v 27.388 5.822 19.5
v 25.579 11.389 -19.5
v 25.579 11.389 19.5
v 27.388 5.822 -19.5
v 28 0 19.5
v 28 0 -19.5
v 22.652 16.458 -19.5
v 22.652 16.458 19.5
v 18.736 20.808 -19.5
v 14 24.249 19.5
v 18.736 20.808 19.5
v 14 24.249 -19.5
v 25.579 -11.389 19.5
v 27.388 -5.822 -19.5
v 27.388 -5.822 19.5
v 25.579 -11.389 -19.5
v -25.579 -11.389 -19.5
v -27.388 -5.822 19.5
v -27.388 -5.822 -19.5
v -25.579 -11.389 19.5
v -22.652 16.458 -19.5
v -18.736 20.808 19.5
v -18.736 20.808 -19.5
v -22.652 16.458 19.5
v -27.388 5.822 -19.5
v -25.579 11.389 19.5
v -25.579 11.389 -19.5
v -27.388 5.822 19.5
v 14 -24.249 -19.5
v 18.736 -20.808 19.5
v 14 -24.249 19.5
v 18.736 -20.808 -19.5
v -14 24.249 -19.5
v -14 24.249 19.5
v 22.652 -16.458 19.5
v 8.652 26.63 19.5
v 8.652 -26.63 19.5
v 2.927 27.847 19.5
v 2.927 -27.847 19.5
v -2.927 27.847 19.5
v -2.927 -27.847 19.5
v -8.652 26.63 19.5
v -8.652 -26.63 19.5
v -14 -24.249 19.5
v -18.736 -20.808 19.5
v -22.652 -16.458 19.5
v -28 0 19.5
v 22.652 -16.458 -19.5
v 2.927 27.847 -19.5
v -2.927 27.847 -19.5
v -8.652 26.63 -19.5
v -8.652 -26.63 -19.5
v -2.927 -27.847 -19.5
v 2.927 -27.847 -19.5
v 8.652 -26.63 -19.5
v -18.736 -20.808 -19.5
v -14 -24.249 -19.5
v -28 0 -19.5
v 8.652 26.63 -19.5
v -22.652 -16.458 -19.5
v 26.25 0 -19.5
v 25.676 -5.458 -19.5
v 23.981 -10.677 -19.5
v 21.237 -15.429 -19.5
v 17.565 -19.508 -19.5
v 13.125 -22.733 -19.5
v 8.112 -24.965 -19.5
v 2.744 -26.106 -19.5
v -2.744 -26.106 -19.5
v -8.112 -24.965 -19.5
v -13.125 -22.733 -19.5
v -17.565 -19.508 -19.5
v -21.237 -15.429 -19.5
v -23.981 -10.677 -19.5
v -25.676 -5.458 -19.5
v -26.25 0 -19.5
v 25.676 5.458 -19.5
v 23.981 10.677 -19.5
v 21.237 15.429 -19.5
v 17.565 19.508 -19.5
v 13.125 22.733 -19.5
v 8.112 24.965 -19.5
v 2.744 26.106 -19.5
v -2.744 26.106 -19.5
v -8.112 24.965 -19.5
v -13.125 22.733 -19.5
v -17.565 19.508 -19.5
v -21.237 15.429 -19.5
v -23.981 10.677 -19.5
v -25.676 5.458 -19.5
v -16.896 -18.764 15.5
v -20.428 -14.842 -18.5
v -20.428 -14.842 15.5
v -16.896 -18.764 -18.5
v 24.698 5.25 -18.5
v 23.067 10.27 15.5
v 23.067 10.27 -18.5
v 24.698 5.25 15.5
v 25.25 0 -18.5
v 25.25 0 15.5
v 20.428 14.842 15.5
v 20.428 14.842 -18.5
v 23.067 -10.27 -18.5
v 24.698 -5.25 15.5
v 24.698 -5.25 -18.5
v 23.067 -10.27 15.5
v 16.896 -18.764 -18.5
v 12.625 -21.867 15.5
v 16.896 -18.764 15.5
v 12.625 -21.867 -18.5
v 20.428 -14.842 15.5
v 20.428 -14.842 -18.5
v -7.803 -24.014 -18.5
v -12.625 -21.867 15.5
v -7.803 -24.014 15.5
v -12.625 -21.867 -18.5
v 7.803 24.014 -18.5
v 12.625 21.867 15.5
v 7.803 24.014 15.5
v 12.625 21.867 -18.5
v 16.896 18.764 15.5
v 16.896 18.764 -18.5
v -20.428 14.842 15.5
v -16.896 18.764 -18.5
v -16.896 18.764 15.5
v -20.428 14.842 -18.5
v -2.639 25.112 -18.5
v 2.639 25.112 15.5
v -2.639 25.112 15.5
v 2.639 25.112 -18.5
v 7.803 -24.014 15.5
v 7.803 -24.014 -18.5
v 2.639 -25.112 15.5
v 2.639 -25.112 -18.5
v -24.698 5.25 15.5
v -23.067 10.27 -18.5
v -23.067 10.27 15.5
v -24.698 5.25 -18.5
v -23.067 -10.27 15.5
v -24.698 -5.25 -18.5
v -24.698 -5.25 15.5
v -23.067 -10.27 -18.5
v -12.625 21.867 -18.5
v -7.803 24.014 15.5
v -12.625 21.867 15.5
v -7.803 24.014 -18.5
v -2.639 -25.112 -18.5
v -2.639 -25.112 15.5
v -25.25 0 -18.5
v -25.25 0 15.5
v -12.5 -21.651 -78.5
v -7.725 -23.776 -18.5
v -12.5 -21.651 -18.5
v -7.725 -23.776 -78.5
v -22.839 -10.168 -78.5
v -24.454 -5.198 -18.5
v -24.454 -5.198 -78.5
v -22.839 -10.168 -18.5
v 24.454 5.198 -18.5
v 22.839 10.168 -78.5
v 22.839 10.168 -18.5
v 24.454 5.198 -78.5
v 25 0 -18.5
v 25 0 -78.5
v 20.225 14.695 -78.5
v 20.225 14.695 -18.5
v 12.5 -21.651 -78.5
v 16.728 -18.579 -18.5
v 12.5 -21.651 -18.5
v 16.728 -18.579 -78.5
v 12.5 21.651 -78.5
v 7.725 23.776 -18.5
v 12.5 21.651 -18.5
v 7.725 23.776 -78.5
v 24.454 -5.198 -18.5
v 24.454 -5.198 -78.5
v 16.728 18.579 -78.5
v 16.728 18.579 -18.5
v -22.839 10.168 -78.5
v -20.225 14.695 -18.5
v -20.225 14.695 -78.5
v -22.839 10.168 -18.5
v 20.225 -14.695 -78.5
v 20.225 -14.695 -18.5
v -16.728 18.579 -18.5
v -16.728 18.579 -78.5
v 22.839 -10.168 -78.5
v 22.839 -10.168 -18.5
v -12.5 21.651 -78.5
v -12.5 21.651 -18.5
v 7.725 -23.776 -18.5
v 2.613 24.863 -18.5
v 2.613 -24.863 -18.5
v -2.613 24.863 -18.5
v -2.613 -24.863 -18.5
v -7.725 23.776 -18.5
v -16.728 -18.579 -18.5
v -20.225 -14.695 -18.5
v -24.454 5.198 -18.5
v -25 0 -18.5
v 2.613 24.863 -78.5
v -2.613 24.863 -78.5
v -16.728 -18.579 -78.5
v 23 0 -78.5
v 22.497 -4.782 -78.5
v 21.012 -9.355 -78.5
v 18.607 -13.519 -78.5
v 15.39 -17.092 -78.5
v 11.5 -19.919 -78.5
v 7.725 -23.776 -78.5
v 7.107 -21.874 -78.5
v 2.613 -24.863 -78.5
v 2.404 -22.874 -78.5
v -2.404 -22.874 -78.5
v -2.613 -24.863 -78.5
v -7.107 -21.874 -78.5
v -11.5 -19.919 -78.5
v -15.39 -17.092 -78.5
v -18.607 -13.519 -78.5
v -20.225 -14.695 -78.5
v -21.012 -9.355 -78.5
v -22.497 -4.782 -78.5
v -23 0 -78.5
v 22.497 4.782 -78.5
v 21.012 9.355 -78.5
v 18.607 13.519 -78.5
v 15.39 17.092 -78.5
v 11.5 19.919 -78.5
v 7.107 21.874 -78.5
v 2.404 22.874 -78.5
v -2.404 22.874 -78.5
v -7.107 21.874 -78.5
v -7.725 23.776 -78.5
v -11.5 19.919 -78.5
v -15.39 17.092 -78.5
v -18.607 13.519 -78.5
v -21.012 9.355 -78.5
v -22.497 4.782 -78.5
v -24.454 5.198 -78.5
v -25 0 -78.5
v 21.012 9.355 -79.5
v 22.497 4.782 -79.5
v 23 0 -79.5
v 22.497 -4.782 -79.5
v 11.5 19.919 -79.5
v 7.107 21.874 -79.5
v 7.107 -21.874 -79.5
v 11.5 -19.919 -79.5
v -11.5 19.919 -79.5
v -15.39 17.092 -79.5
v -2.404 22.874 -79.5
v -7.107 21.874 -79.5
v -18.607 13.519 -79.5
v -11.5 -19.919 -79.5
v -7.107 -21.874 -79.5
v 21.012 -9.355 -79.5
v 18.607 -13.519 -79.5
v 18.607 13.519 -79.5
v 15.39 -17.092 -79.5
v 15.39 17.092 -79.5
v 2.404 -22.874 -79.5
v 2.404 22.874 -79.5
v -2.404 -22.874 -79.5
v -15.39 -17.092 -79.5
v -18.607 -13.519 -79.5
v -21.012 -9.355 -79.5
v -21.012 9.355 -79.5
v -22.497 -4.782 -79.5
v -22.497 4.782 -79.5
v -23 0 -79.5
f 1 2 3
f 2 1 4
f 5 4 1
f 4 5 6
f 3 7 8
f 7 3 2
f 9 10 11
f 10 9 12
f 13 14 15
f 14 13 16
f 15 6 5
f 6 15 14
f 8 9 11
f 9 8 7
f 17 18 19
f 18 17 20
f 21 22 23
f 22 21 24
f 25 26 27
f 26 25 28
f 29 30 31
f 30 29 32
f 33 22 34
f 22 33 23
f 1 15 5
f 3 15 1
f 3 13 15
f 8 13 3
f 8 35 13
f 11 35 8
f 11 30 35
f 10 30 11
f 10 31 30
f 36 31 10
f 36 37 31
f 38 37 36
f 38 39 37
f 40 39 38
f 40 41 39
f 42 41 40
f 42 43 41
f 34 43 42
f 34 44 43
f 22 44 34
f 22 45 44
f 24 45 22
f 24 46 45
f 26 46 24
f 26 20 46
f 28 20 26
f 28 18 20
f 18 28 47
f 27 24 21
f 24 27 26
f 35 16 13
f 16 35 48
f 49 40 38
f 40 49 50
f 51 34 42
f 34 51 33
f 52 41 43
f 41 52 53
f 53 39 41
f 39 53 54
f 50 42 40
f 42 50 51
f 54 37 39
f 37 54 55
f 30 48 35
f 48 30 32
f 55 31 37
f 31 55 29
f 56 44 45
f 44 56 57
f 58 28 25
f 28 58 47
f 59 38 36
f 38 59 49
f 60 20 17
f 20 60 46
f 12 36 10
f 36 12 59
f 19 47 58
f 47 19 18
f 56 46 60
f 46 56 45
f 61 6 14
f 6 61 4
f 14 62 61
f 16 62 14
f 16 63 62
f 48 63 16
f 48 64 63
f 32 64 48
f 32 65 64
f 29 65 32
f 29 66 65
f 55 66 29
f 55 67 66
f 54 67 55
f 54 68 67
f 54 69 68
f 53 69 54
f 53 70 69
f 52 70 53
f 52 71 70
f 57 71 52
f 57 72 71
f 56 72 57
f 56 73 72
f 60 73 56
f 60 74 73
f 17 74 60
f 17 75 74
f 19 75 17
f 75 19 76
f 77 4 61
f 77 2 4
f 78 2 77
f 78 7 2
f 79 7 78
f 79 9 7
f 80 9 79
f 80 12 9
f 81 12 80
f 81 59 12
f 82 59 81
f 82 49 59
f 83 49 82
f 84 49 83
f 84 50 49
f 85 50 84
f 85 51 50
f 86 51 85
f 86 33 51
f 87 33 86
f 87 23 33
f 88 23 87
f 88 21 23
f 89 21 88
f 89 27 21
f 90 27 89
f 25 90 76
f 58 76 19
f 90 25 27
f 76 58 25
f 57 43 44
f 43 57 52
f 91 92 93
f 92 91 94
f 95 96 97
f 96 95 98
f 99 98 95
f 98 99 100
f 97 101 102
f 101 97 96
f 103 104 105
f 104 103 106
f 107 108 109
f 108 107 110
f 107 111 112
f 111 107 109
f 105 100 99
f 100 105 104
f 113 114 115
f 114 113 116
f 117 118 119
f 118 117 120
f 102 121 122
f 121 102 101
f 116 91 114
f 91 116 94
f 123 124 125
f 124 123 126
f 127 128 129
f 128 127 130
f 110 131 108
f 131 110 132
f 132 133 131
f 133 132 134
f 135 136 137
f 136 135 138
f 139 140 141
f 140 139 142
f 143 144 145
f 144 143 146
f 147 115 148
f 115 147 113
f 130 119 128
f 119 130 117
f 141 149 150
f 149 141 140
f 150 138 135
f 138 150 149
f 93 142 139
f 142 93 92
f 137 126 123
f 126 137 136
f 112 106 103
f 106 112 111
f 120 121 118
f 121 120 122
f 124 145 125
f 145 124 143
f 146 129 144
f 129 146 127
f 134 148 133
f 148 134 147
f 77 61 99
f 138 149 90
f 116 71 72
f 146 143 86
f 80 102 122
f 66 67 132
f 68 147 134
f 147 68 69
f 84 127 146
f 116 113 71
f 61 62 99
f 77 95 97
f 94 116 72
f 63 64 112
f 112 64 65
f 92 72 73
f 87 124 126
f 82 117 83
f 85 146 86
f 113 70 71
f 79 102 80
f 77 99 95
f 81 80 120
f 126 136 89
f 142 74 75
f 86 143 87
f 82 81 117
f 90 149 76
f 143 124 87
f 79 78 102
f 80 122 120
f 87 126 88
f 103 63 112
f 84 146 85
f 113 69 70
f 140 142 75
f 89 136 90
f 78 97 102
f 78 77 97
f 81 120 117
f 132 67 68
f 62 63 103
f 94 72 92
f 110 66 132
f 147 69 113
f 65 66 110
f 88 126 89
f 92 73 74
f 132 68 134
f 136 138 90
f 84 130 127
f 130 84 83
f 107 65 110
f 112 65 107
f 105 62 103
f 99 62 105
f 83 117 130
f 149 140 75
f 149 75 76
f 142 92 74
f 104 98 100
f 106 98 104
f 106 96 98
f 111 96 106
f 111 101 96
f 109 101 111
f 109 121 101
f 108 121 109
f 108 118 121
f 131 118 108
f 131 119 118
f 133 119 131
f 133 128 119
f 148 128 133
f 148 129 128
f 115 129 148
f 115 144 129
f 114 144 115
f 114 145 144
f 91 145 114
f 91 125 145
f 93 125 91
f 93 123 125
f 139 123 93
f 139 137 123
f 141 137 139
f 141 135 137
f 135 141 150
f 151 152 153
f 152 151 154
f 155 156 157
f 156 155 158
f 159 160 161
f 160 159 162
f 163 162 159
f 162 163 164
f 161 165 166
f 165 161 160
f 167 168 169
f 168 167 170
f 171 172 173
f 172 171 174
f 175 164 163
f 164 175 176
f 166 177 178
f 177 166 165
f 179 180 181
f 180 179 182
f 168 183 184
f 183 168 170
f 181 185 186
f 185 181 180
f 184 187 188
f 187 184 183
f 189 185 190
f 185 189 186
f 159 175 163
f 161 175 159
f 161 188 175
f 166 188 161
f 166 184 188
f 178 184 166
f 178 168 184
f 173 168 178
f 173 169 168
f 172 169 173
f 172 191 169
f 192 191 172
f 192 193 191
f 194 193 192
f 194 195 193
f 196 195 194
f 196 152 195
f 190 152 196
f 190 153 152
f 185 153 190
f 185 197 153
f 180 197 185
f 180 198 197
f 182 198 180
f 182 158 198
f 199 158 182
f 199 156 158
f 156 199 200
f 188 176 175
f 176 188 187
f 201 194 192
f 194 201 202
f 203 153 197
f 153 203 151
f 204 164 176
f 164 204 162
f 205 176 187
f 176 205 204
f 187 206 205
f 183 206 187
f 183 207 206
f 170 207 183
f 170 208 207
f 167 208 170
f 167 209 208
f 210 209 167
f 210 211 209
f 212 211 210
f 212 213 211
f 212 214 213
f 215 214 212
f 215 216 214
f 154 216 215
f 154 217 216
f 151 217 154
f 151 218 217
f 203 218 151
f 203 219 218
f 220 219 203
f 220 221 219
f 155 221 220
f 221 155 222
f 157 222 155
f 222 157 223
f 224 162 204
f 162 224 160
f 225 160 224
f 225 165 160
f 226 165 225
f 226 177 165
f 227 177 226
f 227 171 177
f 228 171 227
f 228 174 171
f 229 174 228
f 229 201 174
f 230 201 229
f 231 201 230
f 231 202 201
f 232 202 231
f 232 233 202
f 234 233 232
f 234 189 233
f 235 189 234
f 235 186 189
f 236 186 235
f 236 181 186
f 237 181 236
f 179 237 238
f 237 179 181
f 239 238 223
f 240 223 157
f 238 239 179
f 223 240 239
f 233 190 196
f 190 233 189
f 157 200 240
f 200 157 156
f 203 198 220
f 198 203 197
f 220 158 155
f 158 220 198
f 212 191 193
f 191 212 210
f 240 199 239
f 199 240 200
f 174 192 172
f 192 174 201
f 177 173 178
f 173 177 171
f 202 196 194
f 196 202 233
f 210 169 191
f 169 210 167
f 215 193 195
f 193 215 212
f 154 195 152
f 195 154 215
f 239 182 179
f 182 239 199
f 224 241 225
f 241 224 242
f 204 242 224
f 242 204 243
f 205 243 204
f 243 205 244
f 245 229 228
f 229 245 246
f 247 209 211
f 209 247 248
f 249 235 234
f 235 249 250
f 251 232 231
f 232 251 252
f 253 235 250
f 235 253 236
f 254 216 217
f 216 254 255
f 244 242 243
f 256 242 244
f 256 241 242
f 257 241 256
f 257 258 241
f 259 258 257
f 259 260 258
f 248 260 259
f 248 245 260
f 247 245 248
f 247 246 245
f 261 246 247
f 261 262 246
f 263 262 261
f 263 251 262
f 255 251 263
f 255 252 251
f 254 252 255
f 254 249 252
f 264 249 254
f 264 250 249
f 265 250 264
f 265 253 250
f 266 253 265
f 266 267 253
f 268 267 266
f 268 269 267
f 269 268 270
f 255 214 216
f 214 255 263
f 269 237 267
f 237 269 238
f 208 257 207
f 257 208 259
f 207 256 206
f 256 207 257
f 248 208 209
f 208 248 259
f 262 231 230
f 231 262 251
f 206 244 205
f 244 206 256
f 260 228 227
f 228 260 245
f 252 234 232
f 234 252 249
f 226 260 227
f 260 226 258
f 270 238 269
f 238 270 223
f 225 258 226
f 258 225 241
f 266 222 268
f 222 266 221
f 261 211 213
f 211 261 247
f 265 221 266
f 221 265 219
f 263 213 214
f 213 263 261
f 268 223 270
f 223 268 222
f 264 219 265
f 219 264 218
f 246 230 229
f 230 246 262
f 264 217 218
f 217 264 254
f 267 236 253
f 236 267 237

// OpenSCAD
// Parameters
pipe_outer_diameter_mm = 50; //[25:100:0.1]
cap_outer_diameter_mm = 56; //[28:112:0.1]
wall_thickness_mm = 3; //[1.5:6:0.1]
socket_inner_diameter_mm = 50.5; //[25.25:101:0.1]
insertion_depth_mm = 35; //[17.5:70:0.5]
end_thickness_mm = 4; //[2:8:0.1]
chamfer_mm = 1; //[0:3:0.1]
overlap_mm = 1; //[0.5:2:0.1]
pipe_length_mm = 60; //[30:120:1]
pipe_wall_thickness_mm = 2; //[1:4:0.1]

// HT Pipe - complete geometry
module ht_pipe() {
  color("DimGray") {
    // Outer pipe
    cylinder(r=pipe_outer_diameter_mm/2, h=pipe_length_mm, center=true);
    // Inner cavity
    translate([0, 0, -overlap_mm/2])
      cylinder(r=(pipe_outer_diameter_mm/2) - pipe_wall_thickness_mm, h=pipe_length_mm + overlap_mm, center=true);
  }
}

// Cap assembly
module cap_assembly() {
  color("Silver") {
    // Cap body
    difference() {
      cylinder(r=cap_outer_diameter_mm/2, h=insertion_depth_mm + end_thickness_mm, center=true);
      // Inner socket cavity
      translate([0, 0, (insertion_depth_mm + overlap_mm)/2 - (insertion_depth_mm + end_thickness_mm)/2])
        cylinder(r=socket_inner_diameter_mm/2, h=insertion_depth_mm + overlap_mm, center=true);
      // Socket chamfer cavity
      translate([0, 0, -(insertion_depth_mm + end_thickness_mm)/2 + chamfer_mm/2])
        cylinder(r1=(socket_inner_diameter_mm/2) + chamfer_mm, r2=socket_inner_diameter_mm/2, h=chamfer_mm, center=true);
    }
    // End face
    translate([0, 0, (insertion_depth_mm + end_thickness_mm)/2 - end_thickness_mm/2])
      cylinder(r=cap_outer_diameter_mm/2, h=end_thickness_mm, center=true);
  }
}

// Assembly
module assembly() {
  cap_assembly();
  translate([0, 0, -(insertion_depth_mm + end_thickness_mm)/2 - pipe_length_mm/2 + overlap_mm])
    ht_pipe();
}

assembly();
